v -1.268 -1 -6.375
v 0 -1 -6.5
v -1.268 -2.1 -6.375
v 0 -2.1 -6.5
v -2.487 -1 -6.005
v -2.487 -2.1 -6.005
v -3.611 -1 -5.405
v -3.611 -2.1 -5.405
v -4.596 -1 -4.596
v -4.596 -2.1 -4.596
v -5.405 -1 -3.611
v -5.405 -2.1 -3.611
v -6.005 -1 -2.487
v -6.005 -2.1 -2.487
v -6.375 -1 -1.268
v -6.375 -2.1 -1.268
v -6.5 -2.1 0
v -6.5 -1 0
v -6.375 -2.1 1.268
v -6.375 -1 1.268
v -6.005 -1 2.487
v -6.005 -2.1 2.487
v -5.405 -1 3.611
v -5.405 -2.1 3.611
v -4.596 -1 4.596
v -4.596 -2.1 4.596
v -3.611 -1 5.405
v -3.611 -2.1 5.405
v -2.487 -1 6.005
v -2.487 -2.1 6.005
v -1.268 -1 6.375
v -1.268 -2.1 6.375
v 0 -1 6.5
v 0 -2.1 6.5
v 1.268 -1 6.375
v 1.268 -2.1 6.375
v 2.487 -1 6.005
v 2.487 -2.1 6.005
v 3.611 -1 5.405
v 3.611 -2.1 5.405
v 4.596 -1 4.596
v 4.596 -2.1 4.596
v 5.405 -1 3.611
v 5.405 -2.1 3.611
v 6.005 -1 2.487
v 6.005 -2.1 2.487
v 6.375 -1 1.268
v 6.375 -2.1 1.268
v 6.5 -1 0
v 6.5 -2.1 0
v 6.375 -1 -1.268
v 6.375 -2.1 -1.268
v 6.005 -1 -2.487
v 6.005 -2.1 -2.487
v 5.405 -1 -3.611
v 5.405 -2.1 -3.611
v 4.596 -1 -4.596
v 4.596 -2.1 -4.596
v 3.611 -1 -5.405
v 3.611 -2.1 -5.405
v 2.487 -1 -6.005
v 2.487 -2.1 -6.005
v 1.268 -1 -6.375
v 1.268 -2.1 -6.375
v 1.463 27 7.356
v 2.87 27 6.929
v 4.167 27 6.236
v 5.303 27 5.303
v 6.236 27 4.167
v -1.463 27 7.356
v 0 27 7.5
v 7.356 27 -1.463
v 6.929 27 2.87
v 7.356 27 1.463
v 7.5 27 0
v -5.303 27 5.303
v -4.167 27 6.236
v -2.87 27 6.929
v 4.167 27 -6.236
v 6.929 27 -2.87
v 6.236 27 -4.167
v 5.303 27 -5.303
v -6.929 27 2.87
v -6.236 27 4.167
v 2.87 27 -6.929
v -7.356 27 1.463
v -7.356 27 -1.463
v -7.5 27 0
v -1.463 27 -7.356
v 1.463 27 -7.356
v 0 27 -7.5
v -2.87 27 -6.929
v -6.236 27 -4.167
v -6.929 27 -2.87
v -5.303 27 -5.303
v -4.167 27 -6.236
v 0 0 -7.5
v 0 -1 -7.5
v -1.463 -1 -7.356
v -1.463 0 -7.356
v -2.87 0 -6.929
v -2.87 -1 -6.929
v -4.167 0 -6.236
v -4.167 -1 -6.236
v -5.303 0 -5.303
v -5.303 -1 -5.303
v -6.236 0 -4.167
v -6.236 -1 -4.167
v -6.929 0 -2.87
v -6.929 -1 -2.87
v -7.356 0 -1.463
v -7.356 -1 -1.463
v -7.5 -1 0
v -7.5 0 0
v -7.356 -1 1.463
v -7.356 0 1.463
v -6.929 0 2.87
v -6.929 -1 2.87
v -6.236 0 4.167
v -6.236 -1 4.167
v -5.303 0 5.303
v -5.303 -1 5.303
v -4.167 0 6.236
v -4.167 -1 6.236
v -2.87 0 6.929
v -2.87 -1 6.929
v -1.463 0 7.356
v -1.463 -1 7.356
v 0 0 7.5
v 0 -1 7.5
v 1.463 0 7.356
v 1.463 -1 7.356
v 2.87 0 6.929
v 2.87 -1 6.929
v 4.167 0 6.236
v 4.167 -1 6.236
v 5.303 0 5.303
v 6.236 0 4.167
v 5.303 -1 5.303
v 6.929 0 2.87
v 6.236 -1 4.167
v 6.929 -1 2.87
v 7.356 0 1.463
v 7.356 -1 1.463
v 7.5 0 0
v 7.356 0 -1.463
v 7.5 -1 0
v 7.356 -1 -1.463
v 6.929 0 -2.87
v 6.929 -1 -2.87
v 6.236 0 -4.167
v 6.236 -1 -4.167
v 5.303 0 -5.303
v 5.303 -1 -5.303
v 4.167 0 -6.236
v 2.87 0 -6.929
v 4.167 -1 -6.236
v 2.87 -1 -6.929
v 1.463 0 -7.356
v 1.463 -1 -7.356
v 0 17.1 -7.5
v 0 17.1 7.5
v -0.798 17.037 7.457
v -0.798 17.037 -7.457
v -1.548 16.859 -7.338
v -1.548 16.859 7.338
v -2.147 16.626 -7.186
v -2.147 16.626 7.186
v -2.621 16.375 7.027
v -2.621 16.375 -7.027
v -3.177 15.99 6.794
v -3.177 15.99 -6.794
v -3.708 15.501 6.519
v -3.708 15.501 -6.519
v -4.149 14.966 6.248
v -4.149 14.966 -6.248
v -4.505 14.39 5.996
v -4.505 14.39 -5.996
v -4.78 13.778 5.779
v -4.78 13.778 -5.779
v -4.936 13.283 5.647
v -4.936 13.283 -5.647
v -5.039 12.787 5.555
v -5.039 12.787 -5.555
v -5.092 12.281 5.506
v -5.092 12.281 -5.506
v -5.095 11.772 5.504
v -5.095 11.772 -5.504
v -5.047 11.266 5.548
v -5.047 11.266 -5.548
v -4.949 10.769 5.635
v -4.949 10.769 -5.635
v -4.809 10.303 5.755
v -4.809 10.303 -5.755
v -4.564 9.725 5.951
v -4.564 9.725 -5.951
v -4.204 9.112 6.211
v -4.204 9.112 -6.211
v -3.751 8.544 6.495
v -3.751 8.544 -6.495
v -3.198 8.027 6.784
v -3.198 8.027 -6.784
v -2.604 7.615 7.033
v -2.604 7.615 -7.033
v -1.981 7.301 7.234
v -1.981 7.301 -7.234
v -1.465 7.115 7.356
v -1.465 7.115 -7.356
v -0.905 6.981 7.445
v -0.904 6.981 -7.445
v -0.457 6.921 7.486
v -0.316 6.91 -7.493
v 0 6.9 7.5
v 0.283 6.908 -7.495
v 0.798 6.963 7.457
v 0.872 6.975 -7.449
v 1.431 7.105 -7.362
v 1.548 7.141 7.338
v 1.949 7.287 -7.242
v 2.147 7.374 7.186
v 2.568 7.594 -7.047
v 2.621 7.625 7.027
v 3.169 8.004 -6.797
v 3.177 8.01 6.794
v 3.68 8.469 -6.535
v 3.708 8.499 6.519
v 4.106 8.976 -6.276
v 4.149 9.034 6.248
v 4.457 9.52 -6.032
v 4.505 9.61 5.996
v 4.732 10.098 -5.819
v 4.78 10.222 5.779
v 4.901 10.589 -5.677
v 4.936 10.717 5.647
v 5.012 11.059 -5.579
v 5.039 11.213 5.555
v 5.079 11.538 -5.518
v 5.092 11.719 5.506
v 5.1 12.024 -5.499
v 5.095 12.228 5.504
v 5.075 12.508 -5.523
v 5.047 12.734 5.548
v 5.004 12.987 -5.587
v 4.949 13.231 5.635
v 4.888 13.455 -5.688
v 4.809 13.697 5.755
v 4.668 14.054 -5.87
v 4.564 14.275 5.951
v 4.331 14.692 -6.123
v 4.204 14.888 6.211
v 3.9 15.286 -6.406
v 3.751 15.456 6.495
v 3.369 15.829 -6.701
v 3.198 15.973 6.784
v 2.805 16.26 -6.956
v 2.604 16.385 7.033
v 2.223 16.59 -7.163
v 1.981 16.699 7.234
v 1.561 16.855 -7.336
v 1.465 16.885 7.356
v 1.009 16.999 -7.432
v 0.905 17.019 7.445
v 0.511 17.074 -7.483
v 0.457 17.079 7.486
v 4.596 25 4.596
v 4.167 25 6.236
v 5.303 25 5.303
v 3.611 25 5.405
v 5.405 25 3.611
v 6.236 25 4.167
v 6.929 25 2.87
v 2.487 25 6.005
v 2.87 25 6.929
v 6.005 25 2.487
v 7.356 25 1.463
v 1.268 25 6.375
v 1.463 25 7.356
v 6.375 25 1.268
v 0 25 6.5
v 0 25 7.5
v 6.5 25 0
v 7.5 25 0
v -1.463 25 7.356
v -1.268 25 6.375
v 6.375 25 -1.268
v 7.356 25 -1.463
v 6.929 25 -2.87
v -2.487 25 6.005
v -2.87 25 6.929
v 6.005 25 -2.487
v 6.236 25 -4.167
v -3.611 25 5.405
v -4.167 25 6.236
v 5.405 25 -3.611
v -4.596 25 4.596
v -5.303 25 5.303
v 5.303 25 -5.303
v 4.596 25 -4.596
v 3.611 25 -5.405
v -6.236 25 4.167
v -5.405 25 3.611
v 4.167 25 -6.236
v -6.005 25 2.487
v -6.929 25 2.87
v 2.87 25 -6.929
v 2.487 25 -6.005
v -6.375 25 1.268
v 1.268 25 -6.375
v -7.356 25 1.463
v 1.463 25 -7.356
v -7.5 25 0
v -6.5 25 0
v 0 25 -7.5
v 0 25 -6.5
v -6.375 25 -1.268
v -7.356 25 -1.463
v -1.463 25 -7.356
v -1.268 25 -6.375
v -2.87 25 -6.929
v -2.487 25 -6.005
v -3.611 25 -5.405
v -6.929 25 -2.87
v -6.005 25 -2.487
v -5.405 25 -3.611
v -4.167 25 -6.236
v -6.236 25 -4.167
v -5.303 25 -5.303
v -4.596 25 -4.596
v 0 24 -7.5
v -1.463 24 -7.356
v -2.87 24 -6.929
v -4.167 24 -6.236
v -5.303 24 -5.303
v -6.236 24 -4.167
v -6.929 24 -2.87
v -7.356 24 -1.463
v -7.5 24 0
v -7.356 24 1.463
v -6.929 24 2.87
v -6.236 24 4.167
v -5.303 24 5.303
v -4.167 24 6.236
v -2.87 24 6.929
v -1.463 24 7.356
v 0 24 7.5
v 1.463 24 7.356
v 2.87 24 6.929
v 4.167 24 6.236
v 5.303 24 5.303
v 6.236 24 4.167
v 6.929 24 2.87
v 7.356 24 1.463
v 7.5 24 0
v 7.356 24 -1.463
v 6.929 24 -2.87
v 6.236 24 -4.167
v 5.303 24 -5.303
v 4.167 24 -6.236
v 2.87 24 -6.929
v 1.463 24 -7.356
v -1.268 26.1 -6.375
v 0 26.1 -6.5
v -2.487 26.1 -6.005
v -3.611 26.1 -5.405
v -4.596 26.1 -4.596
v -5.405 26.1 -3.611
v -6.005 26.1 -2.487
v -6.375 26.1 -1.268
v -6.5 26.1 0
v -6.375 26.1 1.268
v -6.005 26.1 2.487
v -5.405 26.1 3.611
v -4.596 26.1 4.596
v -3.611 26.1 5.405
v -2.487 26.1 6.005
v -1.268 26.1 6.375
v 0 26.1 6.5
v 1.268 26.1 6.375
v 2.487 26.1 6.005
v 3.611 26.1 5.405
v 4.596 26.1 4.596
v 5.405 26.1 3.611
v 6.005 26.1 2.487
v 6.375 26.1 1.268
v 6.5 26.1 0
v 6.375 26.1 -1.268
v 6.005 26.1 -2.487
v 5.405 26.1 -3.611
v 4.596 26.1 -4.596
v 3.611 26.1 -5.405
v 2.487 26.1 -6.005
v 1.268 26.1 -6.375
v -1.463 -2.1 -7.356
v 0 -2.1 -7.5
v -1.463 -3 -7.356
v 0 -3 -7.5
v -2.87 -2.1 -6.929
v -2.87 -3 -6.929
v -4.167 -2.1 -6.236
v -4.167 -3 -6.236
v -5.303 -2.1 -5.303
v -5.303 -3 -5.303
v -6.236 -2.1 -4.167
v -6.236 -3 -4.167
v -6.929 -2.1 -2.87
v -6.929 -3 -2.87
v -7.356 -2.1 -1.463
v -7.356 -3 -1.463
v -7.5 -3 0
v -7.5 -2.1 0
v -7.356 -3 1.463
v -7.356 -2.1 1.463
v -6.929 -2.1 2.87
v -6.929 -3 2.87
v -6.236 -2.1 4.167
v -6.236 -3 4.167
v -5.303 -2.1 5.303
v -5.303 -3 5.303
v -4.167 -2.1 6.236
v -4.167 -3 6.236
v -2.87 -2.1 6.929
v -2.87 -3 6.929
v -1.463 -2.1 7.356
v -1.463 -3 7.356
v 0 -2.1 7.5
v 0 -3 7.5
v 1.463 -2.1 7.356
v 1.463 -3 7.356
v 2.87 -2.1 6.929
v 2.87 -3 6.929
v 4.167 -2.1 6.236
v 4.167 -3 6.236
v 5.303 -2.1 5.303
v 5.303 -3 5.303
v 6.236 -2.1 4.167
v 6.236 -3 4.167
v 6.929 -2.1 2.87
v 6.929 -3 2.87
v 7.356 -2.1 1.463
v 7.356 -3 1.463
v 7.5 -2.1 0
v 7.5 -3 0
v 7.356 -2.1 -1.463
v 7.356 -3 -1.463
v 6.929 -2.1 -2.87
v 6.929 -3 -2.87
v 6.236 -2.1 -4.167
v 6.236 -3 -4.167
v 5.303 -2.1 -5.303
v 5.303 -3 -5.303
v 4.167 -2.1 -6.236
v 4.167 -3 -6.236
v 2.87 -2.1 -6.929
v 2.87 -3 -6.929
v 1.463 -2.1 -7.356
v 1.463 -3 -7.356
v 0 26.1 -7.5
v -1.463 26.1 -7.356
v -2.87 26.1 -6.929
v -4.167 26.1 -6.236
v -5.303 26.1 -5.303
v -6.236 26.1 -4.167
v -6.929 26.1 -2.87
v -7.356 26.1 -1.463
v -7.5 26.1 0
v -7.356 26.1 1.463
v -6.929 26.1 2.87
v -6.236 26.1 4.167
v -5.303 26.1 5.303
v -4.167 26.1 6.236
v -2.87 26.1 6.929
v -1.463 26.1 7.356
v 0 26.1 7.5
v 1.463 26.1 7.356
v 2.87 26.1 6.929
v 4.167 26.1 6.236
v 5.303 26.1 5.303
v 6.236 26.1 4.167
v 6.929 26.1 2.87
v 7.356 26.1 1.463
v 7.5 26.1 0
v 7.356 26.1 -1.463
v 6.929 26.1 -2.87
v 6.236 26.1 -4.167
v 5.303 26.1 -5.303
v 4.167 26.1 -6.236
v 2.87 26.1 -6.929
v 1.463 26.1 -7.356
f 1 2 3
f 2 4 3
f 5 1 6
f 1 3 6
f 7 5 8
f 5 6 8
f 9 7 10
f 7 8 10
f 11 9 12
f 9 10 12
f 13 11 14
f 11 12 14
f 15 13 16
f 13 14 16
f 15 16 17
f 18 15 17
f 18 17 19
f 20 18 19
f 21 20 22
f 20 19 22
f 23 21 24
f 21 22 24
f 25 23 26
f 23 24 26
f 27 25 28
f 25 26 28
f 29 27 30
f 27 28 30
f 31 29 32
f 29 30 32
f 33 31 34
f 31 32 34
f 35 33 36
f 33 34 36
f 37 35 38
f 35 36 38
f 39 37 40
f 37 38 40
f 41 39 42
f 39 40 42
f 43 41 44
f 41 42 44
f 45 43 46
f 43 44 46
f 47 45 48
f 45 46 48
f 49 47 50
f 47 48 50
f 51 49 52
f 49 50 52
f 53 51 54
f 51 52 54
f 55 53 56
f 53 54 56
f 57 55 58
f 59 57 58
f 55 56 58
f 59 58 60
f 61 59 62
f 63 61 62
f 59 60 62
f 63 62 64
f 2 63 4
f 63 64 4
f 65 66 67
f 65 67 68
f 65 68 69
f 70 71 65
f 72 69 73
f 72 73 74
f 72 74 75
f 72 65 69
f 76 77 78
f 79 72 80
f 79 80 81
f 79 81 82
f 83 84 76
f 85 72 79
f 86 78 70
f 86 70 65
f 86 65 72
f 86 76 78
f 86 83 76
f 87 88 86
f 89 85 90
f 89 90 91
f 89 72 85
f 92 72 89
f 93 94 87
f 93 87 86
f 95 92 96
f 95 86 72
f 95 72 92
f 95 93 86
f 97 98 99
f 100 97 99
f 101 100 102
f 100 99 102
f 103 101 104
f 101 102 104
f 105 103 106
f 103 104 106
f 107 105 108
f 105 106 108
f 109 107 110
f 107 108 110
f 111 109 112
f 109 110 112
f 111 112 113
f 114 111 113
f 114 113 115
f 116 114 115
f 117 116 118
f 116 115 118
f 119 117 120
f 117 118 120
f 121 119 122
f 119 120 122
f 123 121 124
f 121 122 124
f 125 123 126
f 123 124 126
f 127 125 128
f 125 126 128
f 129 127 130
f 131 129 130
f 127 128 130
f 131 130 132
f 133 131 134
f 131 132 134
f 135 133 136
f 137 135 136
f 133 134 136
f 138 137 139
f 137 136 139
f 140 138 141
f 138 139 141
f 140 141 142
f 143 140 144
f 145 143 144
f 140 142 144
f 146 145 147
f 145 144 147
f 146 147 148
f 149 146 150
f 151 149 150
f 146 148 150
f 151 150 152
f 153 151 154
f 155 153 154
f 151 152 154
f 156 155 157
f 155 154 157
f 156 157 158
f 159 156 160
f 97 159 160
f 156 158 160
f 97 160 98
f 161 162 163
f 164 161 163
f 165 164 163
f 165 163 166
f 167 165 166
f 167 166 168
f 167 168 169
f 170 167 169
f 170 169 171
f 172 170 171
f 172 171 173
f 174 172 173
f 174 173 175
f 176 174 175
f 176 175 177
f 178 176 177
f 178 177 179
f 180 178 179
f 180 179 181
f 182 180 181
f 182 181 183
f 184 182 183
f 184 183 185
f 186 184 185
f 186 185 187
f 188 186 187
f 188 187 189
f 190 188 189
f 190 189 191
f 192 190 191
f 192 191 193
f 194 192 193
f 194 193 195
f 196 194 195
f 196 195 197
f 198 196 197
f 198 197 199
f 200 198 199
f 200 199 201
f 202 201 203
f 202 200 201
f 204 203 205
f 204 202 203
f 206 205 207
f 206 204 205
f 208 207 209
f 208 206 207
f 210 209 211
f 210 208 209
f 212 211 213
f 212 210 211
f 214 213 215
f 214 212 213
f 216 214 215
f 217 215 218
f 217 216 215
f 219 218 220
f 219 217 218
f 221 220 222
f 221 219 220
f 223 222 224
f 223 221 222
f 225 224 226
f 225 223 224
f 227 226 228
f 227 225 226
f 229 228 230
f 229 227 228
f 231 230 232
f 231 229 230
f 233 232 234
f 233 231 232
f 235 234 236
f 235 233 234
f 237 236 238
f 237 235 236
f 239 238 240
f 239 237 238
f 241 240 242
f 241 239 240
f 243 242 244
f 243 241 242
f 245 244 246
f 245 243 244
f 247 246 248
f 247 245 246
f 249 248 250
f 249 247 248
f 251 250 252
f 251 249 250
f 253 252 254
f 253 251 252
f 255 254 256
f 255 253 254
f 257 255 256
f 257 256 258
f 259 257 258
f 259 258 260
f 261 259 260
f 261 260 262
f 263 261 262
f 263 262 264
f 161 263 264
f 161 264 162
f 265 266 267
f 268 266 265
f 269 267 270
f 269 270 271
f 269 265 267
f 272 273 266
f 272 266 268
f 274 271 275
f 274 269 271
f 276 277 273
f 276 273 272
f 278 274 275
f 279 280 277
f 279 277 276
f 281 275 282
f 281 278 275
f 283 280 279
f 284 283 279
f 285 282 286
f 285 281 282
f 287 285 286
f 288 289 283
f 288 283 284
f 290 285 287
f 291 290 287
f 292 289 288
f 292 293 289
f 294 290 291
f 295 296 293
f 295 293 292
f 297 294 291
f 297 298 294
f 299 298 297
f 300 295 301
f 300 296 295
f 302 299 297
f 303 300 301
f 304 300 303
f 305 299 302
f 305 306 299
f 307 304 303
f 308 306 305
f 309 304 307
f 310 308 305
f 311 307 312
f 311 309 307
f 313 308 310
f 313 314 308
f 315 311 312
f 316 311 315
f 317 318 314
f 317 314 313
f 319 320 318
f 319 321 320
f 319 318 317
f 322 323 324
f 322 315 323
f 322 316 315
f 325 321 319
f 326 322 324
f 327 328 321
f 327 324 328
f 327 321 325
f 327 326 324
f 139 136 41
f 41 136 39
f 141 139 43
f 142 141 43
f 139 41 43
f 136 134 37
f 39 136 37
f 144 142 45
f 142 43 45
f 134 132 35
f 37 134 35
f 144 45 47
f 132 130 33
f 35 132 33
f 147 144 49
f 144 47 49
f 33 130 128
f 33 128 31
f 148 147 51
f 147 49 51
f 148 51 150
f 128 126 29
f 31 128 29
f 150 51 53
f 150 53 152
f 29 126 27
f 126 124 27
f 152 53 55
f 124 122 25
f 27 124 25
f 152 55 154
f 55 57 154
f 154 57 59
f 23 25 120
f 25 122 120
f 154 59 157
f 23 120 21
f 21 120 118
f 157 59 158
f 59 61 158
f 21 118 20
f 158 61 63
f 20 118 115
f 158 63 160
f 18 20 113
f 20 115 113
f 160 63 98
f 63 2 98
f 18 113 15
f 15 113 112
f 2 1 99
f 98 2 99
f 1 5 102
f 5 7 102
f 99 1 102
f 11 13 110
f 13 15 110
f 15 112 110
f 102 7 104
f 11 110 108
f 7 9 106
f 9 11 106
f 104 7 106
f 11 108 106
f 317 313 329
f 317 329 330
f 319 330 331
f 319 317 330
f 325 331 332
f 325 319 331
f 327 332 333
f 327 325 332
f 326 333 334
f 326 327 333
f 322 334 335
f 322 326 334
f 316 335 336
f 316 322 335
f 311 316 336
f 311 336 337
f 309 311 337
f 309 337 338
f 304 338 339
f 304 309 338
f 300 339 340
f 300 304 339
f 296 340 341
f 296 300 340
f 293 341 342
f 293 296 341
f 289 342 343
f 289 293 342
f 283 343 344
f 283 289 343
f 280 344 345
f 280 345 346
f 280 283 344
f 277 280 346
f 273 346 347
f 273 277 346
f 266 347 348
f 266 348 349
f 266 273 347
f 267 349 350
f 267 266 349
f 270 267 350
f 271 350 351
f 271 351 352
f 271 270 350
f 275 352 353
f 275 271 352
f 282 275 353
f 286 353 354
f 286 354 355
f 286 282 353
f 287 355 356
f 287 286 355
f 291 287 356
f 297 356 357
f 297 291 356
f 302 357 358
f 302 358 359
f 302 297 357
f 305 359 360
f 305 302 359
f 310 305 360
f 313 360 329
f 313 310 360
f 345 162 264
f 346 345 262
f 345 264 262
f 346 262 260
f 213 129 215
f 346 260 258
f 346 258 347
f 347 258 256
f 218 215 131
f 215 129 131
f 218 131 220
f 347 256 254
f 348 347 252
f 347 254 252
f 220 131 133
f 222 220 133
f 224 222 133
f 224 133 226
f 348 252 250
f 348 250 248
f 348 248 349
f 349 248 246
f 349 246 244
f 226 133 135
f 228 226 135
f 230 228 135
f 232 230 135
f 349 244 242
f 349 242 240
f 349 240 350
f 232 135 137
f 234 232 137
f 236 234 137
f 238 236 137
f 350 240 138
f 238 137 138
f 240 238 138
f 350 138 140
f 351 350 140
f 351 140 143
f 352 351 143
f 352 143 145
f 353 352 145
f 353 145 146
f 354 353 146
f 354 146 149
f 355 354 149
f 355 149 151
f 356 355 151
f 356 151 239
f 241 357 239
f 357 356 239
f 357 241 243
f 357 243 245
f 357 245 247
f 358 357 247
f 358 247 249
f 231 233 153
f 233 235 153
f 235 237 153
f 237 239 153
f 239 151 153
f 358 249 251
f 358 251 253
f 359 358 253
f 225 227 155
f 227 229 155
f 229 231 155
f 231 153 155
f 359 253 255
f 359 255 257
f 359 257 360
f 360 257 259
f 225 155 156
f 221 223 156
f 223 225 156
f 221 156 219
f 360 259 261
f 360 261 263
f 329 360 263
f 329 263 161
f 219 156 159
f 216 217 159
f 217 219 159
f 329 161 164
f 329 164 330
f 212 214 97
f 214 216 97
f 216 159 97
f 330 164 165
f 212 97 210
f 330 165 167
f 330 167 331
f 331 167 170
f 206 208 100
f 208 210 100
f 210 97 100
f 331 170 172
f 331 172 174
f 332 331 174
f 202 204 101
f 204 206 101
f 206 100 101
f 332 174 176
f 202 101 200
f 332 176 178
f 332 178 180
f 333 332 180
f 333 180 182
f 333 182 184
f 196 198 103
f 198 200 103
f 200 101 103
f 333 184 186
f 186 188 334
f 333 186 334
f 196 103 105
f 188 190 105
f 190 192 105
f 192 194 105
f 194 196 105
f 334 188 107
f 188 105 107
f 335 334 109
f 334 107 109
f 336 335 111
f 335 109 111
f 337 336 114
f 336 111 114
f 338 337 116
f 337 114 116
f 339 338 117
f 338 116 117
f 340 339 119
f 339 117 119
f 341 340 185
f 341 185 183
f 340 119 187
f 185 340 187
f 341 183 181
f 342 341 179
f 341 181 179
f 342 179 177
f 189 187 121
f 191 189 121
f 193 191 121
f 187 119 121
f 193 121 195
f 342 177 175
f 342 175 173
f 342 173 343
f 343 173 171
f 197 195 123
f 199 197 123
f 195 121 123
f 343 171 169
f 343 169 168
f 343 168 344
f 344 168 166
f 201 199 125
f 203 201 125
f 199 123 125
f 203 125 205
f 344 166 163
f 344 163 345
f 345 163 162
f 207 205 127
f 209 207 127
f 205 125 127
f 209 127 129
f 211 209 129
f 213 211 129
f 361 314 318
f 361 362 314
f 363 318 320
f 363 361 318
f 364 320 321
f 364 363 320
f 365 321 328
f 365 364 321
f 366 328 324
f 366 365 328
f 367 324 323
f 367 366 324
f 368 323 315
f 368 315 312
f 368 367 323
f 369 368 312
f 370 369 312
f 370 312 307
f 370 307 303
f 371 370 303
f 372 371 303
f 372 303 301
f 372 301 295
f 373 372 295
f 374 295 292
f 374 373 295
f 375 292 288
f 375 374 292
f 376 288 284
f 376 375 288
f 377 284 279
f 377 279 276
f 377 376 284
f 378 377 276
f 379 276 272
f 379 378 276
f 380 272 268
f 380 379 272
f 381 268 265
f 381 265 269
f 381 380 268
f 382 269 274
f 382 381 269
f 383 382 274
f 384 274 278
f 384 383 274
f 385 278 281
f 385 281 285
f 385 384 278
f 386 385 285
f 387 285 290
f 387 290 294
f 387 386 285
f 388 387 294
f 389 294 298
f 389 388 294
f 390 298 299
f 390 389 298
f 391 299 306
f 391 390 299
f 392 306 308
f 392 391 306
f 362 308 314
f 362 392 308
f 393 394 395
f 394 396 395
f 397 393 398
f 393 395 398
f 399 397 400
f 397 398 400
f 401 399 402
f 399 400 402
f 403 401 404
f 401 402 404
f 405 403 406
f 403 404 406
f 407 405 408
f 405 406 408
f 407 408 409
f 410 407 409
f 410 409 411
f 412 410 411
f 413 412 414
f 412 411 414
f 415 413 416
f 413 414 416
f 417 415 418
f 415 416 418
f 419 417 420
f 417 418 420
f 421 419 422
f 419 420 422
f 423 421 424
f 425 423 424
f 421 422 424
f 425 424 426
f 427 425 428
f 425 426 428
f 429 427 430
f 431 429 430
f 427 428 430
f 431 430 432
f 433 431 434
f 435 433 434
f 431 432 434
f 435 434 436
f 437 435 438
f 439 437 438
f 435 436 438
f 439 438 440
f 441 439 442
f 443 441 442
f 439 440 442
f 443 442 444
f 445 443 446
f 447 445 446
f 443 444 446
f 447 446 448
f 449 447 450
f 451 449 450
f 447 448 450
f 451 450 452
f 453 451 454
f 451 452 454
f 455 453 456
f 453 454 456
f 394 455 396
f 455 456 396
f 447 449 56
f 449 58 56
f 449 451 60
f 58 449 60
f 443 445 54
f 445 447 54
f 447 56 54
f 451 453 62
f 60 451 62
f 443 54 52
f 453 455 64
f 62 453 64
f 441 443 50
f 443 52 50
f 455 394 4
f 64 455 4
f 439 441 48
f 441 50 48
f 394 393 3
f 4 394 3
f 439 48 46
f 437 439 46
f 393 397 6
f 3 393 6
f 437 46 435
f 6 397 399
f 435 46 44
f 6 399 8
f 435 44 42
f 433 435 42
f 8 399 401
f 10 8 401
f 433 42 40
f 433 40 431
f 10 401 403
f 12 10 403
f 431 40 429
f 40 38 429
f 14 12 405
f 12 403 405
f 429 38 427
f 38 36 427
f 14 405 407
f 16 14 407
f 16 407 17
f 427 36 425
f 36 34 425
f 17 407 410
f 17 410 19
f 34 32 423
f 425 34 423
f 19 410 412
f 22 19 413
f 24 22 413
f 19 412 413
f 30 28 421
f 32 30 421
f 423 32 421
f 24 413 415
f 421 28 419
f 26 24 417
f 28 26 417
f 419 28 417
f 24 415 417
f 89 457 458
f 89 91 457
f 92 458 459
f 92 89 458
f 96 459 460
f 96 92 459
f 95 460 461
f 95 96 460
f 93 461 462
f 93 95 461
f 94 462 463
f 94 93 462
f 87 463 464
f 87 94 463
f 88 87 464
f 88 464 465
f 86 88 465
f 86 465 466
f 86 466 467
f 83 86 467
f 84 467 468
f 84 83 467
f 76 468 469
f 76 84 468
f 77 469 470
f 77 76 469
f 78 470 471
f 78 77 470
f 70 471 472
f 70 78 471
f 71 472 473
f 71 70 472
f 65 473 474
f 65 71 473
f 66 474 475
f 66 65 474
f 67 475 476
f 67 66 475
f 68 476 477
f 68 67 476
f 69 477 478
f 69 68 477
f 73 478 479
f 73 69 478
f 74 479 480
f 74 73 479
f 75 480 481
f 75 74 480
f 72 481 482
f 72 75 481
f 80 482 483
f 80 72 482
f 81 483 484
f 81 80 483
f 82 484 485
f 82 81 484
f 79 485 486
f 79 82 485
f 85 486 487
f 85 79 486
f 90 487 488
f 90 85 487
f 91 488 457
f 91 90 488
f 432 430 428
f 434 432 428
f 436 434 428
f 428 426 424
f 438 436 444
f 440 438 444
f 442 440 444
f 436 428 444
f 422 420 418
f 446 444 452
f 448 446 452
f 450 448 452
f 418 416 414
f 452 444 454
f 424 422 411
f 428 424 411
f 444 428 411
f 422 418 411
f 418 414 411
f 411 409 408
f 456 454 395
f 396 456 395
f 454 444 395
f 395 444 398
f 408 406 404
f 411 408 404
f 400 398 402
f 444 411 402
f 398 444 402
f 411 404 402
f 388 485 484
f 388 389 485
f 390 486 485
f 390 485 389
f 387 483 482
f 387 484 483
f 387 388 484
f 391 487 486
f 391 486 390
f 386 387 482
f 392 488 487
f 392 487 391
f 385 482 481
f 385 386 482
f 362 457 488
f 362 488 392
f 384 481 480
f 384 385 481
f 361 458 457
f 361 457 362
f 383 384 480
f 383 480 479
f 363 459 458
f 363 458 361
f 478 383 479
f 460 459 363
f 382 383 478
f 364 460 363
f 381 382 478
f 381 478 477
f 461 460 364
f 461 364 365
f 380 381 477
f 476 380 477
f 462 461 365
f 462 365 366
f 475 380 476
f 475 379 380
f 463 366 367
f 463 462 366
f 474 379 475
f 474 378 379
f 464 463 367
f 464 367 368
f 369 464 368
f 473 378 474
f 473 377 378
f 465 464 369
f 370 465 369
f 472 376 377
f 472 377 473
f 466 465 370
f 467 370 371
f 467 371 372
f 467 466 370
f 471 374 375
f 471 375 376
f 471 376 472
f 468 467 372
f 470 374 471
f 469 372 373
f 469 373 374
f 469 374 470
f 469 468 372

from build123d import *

# Parameters (mm, degrees)
SKETCH1_R               = 7.5
BOSS_EXTRUDE1_DEPTH     = 24
CUT_EXTRUDE1_DEPTH      = 27.239283527
CUT_EXTRUDE1_DEPTH_BACK = 27.239283527
SKETCH2_R               = 5.1


with BuildPart() as part:
    # Sketch1 → Boss-Extrude1 (new body)
    with BuildSketch(Plane(origin=(0, 0, 0), x_dir=(1, 0, 0), z_dir=(0, 1, 0))):
        with Locations(Location((0, 0, 0), (0, 0, 270))):
            Circle(SKETCH1_R)
    extrude(amount=BOSS_EXTRUDE1_DEPTH)

    # Sketch2 → Cut-Extrude1 (cut, two sides: drawn at the far end of the back side and taken through both)
    with BuildSketch(Plane.XY.offset(-CUT_EXTRUDE1_DEPTH_BACK)):
        with Locations(Location((0, 12, 0), (0, 0, 90.000000001))):
            Circle(SKETCH2_R)
    extrude(amount=CUT_EXTRUDE1_DEPTH + CUT_EXTRUDE1_DEPTH_BACK, mode=Mode.SUBTRACT)

    # Sketch3 → Revolve1 (revolve)
    with BuildSketch(Plane.XY, mode=Mode.PRIVATE) as revolve1_sk:
        Polygon((0, 24), (-7.5, 24), (-7.5, 25), (-6.5, 25), (-6.5, 26.1), (-7.5, 26.1), (-7.5, 27), (0, 27), align=None)
        Polygon((-7.5, -3), (0, -3), (0, 0), (-7.5, 0), (-7.5, -1), (-6.5, -1), (-6.5, -2.1), (-7.5, -2.1), align=None)
    revolve(revolve1_sk.sketch.rotate(Axis((0, 0, 0), (0, 1, 0)), 270), axis=Axis((0, 0, 0), (0, 1, 0)))


solid = part.part
